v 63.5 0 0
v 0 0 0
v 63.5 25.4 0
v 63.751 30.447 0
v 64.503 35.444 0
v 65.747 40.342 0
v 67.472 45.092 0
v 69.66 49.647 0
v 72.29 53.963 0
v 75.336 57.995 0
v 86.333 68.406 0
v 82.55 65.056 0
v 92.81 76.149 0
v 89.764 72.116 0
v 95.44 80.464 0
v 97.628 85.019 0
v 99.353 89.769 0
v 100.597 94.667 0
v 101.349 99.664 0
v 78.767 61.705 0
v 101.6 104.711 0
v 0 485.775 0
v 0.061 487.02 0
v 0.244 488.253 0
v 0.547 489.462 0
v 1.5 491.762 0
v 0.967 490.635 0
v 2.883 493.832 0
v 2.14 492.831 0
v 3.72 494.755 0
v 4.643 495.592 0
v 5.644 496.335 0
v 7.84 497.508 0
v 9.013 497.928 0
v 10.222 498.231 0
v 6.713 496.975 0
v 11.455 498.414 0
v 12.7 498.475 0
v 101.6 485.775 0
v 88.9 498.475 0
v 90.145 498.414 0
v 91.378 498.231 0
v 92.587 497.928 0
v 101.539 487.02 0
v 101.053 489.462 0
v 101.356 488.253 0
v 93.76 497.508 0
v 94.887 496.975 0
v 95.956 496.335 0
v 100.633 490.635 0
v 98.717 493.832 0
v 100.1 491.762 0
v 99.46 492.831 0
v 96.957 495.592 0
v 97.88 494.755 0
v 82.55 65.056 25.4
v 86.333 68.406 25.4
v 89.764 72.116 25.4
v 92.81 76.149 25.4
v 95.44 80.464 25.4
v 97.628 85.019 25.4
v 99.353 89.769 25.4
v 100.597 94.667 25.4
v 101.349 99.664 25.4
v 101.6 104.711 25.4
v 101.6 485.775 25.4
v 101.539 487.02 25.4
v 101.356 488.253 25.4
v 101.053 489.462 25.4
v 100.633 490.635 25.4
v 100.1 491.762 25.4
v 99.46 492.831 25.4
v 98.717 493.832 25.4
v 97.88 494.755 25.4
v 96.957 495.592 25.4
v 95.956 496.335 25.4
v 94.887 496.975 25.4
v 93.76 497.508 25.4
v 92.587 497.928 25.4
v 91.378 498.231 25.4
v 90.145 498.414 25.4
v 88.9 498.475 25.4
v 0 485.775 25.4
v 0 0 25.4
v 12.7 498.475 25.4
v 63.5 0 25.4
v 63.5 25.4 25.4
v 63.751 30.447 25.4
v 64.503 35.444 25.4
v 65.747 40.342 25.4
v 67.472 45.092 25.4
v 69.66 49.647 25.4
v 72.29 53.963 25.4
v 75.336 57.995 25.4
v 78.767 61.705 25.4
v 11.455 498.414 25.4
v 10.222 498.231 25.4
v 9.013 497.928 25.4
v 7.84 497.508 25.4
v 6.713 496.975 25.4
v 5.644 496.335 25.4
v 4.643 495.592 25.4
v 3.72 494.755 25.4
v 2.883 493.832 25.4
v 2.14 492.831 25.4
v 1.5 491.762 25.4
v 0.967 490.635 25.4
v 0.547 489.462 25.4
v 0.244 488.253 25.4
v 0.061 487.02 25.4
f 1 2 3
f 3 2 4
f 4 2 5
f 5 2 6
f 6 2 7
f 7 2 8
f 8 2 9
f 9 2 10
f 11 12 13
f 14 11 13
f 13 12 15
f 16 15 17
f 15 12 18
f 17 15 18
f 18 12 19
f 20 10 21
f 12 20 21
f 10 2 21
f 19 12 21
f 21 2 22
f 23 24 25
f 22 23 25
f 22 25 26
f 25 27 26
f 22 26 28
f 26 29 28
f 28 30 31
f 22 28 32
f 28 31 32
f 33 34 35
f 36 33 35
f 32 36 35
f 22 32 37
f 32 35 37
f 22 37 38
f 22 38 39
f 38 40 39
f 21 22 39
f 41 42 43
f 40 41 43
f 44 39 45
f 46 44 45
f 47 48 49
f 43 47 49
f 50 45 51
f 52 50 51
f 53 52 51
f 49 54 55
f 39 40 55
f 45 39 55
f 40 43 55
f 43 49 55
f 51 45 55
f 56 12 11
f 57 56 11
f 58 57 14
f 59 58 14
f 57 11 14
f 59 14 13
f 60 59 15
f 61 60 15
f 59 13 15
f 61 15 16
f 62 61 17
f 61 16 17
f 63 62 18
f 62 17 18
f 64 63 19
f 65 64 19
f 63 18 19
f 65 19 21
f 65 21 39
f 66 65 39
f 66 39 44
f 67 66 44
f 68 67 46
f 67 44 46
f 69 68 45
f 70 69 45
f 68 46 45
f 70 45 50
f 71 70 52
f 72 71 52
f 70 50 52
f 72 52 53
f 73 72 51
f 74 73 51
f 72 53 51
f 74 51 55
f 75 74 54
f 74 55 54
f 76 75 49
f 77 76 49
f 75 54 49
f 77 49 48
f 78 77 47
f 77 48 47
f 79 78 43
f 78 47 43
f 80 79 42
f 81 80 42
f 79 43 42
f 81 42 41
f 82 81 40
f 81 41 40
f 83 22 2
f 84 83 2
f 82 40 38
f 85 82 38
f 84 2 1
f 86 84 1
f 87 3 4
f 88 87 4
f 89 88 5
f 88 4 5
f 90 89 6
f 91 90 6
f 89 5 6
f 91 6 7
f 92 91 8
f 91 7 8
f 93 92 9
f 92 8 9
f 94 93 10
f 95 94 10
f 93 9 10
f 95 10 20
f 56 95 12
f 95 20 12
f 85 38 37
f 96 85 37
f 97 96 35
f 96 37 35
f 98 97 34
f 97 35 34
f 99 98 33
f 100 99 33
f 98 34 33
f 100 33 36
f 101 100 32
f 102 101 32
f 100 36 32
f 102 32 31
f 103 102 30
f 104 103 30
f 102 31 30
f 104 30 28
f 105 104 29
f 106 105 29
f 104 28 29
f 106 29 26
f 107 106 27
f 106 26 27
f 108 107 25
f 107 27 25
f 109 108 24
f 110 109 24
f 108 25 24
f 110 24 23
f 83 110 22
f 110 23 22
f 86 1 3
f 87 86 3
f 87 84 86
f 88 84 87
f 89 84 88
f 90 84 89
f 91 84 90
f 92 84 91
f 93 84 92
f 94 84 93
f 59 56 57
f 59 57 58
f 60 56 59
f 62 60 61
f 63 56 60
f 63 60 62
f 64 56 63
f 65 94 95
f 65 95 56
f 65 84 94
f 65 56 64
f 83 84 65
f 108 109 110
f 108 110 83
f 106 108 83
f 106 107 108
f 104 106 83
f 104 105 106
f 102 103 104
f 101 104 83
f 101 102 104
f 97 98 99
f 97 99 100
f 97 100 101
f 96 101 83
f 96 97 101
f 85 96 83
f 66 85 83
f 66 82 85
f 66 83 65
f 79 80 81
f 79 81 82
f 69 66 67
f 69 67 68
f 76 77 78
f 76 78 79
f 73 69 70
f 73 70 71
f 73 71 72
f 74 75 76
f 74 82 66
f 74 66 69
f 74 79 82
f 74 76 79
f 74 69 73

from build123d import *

# Parameters (mm, degrees)
F1_DEPTH = 25.4


# Not quite as in the source:
# - a feature of the source that left no trace in its solid (it failed there, or was rolled back) is left out


with BuildPart() as f1:
    # F0 (on Top) → F1 (new body)
    with BuildSketch(Plane.XY):
        with BuildLine():
            Line((0, 485.775), (0, 0))
            Line((0, 0), (63.5, 0))
            Line((63.5, 0), (63.5, 25.4))
            ThreePointArc((63.5, 25.4), (68.5094988016, 47.3970452561), (82.55, 65.0557372898))
            ThreePointArc((82.55, 65.0557372898), (96.5905011984, 82.7144293235), (101.6, 104.7114745797))
            Line((101.6, 104.7114745797), (101.6, 485.775))
            ThreePointArc((101.6, 485.775), (97.8802561211, 494.7552561211), (88.9, 498.475))
            Line((88.9, 498.475), (12.7, 498.475))
            ThreePointArc((12.7, 498.475), (3.7197438789, 494.7552561211), (0, 485.775))
        make_face()
    extrude(amount=F1_DEPTH)


solid = f1.part
